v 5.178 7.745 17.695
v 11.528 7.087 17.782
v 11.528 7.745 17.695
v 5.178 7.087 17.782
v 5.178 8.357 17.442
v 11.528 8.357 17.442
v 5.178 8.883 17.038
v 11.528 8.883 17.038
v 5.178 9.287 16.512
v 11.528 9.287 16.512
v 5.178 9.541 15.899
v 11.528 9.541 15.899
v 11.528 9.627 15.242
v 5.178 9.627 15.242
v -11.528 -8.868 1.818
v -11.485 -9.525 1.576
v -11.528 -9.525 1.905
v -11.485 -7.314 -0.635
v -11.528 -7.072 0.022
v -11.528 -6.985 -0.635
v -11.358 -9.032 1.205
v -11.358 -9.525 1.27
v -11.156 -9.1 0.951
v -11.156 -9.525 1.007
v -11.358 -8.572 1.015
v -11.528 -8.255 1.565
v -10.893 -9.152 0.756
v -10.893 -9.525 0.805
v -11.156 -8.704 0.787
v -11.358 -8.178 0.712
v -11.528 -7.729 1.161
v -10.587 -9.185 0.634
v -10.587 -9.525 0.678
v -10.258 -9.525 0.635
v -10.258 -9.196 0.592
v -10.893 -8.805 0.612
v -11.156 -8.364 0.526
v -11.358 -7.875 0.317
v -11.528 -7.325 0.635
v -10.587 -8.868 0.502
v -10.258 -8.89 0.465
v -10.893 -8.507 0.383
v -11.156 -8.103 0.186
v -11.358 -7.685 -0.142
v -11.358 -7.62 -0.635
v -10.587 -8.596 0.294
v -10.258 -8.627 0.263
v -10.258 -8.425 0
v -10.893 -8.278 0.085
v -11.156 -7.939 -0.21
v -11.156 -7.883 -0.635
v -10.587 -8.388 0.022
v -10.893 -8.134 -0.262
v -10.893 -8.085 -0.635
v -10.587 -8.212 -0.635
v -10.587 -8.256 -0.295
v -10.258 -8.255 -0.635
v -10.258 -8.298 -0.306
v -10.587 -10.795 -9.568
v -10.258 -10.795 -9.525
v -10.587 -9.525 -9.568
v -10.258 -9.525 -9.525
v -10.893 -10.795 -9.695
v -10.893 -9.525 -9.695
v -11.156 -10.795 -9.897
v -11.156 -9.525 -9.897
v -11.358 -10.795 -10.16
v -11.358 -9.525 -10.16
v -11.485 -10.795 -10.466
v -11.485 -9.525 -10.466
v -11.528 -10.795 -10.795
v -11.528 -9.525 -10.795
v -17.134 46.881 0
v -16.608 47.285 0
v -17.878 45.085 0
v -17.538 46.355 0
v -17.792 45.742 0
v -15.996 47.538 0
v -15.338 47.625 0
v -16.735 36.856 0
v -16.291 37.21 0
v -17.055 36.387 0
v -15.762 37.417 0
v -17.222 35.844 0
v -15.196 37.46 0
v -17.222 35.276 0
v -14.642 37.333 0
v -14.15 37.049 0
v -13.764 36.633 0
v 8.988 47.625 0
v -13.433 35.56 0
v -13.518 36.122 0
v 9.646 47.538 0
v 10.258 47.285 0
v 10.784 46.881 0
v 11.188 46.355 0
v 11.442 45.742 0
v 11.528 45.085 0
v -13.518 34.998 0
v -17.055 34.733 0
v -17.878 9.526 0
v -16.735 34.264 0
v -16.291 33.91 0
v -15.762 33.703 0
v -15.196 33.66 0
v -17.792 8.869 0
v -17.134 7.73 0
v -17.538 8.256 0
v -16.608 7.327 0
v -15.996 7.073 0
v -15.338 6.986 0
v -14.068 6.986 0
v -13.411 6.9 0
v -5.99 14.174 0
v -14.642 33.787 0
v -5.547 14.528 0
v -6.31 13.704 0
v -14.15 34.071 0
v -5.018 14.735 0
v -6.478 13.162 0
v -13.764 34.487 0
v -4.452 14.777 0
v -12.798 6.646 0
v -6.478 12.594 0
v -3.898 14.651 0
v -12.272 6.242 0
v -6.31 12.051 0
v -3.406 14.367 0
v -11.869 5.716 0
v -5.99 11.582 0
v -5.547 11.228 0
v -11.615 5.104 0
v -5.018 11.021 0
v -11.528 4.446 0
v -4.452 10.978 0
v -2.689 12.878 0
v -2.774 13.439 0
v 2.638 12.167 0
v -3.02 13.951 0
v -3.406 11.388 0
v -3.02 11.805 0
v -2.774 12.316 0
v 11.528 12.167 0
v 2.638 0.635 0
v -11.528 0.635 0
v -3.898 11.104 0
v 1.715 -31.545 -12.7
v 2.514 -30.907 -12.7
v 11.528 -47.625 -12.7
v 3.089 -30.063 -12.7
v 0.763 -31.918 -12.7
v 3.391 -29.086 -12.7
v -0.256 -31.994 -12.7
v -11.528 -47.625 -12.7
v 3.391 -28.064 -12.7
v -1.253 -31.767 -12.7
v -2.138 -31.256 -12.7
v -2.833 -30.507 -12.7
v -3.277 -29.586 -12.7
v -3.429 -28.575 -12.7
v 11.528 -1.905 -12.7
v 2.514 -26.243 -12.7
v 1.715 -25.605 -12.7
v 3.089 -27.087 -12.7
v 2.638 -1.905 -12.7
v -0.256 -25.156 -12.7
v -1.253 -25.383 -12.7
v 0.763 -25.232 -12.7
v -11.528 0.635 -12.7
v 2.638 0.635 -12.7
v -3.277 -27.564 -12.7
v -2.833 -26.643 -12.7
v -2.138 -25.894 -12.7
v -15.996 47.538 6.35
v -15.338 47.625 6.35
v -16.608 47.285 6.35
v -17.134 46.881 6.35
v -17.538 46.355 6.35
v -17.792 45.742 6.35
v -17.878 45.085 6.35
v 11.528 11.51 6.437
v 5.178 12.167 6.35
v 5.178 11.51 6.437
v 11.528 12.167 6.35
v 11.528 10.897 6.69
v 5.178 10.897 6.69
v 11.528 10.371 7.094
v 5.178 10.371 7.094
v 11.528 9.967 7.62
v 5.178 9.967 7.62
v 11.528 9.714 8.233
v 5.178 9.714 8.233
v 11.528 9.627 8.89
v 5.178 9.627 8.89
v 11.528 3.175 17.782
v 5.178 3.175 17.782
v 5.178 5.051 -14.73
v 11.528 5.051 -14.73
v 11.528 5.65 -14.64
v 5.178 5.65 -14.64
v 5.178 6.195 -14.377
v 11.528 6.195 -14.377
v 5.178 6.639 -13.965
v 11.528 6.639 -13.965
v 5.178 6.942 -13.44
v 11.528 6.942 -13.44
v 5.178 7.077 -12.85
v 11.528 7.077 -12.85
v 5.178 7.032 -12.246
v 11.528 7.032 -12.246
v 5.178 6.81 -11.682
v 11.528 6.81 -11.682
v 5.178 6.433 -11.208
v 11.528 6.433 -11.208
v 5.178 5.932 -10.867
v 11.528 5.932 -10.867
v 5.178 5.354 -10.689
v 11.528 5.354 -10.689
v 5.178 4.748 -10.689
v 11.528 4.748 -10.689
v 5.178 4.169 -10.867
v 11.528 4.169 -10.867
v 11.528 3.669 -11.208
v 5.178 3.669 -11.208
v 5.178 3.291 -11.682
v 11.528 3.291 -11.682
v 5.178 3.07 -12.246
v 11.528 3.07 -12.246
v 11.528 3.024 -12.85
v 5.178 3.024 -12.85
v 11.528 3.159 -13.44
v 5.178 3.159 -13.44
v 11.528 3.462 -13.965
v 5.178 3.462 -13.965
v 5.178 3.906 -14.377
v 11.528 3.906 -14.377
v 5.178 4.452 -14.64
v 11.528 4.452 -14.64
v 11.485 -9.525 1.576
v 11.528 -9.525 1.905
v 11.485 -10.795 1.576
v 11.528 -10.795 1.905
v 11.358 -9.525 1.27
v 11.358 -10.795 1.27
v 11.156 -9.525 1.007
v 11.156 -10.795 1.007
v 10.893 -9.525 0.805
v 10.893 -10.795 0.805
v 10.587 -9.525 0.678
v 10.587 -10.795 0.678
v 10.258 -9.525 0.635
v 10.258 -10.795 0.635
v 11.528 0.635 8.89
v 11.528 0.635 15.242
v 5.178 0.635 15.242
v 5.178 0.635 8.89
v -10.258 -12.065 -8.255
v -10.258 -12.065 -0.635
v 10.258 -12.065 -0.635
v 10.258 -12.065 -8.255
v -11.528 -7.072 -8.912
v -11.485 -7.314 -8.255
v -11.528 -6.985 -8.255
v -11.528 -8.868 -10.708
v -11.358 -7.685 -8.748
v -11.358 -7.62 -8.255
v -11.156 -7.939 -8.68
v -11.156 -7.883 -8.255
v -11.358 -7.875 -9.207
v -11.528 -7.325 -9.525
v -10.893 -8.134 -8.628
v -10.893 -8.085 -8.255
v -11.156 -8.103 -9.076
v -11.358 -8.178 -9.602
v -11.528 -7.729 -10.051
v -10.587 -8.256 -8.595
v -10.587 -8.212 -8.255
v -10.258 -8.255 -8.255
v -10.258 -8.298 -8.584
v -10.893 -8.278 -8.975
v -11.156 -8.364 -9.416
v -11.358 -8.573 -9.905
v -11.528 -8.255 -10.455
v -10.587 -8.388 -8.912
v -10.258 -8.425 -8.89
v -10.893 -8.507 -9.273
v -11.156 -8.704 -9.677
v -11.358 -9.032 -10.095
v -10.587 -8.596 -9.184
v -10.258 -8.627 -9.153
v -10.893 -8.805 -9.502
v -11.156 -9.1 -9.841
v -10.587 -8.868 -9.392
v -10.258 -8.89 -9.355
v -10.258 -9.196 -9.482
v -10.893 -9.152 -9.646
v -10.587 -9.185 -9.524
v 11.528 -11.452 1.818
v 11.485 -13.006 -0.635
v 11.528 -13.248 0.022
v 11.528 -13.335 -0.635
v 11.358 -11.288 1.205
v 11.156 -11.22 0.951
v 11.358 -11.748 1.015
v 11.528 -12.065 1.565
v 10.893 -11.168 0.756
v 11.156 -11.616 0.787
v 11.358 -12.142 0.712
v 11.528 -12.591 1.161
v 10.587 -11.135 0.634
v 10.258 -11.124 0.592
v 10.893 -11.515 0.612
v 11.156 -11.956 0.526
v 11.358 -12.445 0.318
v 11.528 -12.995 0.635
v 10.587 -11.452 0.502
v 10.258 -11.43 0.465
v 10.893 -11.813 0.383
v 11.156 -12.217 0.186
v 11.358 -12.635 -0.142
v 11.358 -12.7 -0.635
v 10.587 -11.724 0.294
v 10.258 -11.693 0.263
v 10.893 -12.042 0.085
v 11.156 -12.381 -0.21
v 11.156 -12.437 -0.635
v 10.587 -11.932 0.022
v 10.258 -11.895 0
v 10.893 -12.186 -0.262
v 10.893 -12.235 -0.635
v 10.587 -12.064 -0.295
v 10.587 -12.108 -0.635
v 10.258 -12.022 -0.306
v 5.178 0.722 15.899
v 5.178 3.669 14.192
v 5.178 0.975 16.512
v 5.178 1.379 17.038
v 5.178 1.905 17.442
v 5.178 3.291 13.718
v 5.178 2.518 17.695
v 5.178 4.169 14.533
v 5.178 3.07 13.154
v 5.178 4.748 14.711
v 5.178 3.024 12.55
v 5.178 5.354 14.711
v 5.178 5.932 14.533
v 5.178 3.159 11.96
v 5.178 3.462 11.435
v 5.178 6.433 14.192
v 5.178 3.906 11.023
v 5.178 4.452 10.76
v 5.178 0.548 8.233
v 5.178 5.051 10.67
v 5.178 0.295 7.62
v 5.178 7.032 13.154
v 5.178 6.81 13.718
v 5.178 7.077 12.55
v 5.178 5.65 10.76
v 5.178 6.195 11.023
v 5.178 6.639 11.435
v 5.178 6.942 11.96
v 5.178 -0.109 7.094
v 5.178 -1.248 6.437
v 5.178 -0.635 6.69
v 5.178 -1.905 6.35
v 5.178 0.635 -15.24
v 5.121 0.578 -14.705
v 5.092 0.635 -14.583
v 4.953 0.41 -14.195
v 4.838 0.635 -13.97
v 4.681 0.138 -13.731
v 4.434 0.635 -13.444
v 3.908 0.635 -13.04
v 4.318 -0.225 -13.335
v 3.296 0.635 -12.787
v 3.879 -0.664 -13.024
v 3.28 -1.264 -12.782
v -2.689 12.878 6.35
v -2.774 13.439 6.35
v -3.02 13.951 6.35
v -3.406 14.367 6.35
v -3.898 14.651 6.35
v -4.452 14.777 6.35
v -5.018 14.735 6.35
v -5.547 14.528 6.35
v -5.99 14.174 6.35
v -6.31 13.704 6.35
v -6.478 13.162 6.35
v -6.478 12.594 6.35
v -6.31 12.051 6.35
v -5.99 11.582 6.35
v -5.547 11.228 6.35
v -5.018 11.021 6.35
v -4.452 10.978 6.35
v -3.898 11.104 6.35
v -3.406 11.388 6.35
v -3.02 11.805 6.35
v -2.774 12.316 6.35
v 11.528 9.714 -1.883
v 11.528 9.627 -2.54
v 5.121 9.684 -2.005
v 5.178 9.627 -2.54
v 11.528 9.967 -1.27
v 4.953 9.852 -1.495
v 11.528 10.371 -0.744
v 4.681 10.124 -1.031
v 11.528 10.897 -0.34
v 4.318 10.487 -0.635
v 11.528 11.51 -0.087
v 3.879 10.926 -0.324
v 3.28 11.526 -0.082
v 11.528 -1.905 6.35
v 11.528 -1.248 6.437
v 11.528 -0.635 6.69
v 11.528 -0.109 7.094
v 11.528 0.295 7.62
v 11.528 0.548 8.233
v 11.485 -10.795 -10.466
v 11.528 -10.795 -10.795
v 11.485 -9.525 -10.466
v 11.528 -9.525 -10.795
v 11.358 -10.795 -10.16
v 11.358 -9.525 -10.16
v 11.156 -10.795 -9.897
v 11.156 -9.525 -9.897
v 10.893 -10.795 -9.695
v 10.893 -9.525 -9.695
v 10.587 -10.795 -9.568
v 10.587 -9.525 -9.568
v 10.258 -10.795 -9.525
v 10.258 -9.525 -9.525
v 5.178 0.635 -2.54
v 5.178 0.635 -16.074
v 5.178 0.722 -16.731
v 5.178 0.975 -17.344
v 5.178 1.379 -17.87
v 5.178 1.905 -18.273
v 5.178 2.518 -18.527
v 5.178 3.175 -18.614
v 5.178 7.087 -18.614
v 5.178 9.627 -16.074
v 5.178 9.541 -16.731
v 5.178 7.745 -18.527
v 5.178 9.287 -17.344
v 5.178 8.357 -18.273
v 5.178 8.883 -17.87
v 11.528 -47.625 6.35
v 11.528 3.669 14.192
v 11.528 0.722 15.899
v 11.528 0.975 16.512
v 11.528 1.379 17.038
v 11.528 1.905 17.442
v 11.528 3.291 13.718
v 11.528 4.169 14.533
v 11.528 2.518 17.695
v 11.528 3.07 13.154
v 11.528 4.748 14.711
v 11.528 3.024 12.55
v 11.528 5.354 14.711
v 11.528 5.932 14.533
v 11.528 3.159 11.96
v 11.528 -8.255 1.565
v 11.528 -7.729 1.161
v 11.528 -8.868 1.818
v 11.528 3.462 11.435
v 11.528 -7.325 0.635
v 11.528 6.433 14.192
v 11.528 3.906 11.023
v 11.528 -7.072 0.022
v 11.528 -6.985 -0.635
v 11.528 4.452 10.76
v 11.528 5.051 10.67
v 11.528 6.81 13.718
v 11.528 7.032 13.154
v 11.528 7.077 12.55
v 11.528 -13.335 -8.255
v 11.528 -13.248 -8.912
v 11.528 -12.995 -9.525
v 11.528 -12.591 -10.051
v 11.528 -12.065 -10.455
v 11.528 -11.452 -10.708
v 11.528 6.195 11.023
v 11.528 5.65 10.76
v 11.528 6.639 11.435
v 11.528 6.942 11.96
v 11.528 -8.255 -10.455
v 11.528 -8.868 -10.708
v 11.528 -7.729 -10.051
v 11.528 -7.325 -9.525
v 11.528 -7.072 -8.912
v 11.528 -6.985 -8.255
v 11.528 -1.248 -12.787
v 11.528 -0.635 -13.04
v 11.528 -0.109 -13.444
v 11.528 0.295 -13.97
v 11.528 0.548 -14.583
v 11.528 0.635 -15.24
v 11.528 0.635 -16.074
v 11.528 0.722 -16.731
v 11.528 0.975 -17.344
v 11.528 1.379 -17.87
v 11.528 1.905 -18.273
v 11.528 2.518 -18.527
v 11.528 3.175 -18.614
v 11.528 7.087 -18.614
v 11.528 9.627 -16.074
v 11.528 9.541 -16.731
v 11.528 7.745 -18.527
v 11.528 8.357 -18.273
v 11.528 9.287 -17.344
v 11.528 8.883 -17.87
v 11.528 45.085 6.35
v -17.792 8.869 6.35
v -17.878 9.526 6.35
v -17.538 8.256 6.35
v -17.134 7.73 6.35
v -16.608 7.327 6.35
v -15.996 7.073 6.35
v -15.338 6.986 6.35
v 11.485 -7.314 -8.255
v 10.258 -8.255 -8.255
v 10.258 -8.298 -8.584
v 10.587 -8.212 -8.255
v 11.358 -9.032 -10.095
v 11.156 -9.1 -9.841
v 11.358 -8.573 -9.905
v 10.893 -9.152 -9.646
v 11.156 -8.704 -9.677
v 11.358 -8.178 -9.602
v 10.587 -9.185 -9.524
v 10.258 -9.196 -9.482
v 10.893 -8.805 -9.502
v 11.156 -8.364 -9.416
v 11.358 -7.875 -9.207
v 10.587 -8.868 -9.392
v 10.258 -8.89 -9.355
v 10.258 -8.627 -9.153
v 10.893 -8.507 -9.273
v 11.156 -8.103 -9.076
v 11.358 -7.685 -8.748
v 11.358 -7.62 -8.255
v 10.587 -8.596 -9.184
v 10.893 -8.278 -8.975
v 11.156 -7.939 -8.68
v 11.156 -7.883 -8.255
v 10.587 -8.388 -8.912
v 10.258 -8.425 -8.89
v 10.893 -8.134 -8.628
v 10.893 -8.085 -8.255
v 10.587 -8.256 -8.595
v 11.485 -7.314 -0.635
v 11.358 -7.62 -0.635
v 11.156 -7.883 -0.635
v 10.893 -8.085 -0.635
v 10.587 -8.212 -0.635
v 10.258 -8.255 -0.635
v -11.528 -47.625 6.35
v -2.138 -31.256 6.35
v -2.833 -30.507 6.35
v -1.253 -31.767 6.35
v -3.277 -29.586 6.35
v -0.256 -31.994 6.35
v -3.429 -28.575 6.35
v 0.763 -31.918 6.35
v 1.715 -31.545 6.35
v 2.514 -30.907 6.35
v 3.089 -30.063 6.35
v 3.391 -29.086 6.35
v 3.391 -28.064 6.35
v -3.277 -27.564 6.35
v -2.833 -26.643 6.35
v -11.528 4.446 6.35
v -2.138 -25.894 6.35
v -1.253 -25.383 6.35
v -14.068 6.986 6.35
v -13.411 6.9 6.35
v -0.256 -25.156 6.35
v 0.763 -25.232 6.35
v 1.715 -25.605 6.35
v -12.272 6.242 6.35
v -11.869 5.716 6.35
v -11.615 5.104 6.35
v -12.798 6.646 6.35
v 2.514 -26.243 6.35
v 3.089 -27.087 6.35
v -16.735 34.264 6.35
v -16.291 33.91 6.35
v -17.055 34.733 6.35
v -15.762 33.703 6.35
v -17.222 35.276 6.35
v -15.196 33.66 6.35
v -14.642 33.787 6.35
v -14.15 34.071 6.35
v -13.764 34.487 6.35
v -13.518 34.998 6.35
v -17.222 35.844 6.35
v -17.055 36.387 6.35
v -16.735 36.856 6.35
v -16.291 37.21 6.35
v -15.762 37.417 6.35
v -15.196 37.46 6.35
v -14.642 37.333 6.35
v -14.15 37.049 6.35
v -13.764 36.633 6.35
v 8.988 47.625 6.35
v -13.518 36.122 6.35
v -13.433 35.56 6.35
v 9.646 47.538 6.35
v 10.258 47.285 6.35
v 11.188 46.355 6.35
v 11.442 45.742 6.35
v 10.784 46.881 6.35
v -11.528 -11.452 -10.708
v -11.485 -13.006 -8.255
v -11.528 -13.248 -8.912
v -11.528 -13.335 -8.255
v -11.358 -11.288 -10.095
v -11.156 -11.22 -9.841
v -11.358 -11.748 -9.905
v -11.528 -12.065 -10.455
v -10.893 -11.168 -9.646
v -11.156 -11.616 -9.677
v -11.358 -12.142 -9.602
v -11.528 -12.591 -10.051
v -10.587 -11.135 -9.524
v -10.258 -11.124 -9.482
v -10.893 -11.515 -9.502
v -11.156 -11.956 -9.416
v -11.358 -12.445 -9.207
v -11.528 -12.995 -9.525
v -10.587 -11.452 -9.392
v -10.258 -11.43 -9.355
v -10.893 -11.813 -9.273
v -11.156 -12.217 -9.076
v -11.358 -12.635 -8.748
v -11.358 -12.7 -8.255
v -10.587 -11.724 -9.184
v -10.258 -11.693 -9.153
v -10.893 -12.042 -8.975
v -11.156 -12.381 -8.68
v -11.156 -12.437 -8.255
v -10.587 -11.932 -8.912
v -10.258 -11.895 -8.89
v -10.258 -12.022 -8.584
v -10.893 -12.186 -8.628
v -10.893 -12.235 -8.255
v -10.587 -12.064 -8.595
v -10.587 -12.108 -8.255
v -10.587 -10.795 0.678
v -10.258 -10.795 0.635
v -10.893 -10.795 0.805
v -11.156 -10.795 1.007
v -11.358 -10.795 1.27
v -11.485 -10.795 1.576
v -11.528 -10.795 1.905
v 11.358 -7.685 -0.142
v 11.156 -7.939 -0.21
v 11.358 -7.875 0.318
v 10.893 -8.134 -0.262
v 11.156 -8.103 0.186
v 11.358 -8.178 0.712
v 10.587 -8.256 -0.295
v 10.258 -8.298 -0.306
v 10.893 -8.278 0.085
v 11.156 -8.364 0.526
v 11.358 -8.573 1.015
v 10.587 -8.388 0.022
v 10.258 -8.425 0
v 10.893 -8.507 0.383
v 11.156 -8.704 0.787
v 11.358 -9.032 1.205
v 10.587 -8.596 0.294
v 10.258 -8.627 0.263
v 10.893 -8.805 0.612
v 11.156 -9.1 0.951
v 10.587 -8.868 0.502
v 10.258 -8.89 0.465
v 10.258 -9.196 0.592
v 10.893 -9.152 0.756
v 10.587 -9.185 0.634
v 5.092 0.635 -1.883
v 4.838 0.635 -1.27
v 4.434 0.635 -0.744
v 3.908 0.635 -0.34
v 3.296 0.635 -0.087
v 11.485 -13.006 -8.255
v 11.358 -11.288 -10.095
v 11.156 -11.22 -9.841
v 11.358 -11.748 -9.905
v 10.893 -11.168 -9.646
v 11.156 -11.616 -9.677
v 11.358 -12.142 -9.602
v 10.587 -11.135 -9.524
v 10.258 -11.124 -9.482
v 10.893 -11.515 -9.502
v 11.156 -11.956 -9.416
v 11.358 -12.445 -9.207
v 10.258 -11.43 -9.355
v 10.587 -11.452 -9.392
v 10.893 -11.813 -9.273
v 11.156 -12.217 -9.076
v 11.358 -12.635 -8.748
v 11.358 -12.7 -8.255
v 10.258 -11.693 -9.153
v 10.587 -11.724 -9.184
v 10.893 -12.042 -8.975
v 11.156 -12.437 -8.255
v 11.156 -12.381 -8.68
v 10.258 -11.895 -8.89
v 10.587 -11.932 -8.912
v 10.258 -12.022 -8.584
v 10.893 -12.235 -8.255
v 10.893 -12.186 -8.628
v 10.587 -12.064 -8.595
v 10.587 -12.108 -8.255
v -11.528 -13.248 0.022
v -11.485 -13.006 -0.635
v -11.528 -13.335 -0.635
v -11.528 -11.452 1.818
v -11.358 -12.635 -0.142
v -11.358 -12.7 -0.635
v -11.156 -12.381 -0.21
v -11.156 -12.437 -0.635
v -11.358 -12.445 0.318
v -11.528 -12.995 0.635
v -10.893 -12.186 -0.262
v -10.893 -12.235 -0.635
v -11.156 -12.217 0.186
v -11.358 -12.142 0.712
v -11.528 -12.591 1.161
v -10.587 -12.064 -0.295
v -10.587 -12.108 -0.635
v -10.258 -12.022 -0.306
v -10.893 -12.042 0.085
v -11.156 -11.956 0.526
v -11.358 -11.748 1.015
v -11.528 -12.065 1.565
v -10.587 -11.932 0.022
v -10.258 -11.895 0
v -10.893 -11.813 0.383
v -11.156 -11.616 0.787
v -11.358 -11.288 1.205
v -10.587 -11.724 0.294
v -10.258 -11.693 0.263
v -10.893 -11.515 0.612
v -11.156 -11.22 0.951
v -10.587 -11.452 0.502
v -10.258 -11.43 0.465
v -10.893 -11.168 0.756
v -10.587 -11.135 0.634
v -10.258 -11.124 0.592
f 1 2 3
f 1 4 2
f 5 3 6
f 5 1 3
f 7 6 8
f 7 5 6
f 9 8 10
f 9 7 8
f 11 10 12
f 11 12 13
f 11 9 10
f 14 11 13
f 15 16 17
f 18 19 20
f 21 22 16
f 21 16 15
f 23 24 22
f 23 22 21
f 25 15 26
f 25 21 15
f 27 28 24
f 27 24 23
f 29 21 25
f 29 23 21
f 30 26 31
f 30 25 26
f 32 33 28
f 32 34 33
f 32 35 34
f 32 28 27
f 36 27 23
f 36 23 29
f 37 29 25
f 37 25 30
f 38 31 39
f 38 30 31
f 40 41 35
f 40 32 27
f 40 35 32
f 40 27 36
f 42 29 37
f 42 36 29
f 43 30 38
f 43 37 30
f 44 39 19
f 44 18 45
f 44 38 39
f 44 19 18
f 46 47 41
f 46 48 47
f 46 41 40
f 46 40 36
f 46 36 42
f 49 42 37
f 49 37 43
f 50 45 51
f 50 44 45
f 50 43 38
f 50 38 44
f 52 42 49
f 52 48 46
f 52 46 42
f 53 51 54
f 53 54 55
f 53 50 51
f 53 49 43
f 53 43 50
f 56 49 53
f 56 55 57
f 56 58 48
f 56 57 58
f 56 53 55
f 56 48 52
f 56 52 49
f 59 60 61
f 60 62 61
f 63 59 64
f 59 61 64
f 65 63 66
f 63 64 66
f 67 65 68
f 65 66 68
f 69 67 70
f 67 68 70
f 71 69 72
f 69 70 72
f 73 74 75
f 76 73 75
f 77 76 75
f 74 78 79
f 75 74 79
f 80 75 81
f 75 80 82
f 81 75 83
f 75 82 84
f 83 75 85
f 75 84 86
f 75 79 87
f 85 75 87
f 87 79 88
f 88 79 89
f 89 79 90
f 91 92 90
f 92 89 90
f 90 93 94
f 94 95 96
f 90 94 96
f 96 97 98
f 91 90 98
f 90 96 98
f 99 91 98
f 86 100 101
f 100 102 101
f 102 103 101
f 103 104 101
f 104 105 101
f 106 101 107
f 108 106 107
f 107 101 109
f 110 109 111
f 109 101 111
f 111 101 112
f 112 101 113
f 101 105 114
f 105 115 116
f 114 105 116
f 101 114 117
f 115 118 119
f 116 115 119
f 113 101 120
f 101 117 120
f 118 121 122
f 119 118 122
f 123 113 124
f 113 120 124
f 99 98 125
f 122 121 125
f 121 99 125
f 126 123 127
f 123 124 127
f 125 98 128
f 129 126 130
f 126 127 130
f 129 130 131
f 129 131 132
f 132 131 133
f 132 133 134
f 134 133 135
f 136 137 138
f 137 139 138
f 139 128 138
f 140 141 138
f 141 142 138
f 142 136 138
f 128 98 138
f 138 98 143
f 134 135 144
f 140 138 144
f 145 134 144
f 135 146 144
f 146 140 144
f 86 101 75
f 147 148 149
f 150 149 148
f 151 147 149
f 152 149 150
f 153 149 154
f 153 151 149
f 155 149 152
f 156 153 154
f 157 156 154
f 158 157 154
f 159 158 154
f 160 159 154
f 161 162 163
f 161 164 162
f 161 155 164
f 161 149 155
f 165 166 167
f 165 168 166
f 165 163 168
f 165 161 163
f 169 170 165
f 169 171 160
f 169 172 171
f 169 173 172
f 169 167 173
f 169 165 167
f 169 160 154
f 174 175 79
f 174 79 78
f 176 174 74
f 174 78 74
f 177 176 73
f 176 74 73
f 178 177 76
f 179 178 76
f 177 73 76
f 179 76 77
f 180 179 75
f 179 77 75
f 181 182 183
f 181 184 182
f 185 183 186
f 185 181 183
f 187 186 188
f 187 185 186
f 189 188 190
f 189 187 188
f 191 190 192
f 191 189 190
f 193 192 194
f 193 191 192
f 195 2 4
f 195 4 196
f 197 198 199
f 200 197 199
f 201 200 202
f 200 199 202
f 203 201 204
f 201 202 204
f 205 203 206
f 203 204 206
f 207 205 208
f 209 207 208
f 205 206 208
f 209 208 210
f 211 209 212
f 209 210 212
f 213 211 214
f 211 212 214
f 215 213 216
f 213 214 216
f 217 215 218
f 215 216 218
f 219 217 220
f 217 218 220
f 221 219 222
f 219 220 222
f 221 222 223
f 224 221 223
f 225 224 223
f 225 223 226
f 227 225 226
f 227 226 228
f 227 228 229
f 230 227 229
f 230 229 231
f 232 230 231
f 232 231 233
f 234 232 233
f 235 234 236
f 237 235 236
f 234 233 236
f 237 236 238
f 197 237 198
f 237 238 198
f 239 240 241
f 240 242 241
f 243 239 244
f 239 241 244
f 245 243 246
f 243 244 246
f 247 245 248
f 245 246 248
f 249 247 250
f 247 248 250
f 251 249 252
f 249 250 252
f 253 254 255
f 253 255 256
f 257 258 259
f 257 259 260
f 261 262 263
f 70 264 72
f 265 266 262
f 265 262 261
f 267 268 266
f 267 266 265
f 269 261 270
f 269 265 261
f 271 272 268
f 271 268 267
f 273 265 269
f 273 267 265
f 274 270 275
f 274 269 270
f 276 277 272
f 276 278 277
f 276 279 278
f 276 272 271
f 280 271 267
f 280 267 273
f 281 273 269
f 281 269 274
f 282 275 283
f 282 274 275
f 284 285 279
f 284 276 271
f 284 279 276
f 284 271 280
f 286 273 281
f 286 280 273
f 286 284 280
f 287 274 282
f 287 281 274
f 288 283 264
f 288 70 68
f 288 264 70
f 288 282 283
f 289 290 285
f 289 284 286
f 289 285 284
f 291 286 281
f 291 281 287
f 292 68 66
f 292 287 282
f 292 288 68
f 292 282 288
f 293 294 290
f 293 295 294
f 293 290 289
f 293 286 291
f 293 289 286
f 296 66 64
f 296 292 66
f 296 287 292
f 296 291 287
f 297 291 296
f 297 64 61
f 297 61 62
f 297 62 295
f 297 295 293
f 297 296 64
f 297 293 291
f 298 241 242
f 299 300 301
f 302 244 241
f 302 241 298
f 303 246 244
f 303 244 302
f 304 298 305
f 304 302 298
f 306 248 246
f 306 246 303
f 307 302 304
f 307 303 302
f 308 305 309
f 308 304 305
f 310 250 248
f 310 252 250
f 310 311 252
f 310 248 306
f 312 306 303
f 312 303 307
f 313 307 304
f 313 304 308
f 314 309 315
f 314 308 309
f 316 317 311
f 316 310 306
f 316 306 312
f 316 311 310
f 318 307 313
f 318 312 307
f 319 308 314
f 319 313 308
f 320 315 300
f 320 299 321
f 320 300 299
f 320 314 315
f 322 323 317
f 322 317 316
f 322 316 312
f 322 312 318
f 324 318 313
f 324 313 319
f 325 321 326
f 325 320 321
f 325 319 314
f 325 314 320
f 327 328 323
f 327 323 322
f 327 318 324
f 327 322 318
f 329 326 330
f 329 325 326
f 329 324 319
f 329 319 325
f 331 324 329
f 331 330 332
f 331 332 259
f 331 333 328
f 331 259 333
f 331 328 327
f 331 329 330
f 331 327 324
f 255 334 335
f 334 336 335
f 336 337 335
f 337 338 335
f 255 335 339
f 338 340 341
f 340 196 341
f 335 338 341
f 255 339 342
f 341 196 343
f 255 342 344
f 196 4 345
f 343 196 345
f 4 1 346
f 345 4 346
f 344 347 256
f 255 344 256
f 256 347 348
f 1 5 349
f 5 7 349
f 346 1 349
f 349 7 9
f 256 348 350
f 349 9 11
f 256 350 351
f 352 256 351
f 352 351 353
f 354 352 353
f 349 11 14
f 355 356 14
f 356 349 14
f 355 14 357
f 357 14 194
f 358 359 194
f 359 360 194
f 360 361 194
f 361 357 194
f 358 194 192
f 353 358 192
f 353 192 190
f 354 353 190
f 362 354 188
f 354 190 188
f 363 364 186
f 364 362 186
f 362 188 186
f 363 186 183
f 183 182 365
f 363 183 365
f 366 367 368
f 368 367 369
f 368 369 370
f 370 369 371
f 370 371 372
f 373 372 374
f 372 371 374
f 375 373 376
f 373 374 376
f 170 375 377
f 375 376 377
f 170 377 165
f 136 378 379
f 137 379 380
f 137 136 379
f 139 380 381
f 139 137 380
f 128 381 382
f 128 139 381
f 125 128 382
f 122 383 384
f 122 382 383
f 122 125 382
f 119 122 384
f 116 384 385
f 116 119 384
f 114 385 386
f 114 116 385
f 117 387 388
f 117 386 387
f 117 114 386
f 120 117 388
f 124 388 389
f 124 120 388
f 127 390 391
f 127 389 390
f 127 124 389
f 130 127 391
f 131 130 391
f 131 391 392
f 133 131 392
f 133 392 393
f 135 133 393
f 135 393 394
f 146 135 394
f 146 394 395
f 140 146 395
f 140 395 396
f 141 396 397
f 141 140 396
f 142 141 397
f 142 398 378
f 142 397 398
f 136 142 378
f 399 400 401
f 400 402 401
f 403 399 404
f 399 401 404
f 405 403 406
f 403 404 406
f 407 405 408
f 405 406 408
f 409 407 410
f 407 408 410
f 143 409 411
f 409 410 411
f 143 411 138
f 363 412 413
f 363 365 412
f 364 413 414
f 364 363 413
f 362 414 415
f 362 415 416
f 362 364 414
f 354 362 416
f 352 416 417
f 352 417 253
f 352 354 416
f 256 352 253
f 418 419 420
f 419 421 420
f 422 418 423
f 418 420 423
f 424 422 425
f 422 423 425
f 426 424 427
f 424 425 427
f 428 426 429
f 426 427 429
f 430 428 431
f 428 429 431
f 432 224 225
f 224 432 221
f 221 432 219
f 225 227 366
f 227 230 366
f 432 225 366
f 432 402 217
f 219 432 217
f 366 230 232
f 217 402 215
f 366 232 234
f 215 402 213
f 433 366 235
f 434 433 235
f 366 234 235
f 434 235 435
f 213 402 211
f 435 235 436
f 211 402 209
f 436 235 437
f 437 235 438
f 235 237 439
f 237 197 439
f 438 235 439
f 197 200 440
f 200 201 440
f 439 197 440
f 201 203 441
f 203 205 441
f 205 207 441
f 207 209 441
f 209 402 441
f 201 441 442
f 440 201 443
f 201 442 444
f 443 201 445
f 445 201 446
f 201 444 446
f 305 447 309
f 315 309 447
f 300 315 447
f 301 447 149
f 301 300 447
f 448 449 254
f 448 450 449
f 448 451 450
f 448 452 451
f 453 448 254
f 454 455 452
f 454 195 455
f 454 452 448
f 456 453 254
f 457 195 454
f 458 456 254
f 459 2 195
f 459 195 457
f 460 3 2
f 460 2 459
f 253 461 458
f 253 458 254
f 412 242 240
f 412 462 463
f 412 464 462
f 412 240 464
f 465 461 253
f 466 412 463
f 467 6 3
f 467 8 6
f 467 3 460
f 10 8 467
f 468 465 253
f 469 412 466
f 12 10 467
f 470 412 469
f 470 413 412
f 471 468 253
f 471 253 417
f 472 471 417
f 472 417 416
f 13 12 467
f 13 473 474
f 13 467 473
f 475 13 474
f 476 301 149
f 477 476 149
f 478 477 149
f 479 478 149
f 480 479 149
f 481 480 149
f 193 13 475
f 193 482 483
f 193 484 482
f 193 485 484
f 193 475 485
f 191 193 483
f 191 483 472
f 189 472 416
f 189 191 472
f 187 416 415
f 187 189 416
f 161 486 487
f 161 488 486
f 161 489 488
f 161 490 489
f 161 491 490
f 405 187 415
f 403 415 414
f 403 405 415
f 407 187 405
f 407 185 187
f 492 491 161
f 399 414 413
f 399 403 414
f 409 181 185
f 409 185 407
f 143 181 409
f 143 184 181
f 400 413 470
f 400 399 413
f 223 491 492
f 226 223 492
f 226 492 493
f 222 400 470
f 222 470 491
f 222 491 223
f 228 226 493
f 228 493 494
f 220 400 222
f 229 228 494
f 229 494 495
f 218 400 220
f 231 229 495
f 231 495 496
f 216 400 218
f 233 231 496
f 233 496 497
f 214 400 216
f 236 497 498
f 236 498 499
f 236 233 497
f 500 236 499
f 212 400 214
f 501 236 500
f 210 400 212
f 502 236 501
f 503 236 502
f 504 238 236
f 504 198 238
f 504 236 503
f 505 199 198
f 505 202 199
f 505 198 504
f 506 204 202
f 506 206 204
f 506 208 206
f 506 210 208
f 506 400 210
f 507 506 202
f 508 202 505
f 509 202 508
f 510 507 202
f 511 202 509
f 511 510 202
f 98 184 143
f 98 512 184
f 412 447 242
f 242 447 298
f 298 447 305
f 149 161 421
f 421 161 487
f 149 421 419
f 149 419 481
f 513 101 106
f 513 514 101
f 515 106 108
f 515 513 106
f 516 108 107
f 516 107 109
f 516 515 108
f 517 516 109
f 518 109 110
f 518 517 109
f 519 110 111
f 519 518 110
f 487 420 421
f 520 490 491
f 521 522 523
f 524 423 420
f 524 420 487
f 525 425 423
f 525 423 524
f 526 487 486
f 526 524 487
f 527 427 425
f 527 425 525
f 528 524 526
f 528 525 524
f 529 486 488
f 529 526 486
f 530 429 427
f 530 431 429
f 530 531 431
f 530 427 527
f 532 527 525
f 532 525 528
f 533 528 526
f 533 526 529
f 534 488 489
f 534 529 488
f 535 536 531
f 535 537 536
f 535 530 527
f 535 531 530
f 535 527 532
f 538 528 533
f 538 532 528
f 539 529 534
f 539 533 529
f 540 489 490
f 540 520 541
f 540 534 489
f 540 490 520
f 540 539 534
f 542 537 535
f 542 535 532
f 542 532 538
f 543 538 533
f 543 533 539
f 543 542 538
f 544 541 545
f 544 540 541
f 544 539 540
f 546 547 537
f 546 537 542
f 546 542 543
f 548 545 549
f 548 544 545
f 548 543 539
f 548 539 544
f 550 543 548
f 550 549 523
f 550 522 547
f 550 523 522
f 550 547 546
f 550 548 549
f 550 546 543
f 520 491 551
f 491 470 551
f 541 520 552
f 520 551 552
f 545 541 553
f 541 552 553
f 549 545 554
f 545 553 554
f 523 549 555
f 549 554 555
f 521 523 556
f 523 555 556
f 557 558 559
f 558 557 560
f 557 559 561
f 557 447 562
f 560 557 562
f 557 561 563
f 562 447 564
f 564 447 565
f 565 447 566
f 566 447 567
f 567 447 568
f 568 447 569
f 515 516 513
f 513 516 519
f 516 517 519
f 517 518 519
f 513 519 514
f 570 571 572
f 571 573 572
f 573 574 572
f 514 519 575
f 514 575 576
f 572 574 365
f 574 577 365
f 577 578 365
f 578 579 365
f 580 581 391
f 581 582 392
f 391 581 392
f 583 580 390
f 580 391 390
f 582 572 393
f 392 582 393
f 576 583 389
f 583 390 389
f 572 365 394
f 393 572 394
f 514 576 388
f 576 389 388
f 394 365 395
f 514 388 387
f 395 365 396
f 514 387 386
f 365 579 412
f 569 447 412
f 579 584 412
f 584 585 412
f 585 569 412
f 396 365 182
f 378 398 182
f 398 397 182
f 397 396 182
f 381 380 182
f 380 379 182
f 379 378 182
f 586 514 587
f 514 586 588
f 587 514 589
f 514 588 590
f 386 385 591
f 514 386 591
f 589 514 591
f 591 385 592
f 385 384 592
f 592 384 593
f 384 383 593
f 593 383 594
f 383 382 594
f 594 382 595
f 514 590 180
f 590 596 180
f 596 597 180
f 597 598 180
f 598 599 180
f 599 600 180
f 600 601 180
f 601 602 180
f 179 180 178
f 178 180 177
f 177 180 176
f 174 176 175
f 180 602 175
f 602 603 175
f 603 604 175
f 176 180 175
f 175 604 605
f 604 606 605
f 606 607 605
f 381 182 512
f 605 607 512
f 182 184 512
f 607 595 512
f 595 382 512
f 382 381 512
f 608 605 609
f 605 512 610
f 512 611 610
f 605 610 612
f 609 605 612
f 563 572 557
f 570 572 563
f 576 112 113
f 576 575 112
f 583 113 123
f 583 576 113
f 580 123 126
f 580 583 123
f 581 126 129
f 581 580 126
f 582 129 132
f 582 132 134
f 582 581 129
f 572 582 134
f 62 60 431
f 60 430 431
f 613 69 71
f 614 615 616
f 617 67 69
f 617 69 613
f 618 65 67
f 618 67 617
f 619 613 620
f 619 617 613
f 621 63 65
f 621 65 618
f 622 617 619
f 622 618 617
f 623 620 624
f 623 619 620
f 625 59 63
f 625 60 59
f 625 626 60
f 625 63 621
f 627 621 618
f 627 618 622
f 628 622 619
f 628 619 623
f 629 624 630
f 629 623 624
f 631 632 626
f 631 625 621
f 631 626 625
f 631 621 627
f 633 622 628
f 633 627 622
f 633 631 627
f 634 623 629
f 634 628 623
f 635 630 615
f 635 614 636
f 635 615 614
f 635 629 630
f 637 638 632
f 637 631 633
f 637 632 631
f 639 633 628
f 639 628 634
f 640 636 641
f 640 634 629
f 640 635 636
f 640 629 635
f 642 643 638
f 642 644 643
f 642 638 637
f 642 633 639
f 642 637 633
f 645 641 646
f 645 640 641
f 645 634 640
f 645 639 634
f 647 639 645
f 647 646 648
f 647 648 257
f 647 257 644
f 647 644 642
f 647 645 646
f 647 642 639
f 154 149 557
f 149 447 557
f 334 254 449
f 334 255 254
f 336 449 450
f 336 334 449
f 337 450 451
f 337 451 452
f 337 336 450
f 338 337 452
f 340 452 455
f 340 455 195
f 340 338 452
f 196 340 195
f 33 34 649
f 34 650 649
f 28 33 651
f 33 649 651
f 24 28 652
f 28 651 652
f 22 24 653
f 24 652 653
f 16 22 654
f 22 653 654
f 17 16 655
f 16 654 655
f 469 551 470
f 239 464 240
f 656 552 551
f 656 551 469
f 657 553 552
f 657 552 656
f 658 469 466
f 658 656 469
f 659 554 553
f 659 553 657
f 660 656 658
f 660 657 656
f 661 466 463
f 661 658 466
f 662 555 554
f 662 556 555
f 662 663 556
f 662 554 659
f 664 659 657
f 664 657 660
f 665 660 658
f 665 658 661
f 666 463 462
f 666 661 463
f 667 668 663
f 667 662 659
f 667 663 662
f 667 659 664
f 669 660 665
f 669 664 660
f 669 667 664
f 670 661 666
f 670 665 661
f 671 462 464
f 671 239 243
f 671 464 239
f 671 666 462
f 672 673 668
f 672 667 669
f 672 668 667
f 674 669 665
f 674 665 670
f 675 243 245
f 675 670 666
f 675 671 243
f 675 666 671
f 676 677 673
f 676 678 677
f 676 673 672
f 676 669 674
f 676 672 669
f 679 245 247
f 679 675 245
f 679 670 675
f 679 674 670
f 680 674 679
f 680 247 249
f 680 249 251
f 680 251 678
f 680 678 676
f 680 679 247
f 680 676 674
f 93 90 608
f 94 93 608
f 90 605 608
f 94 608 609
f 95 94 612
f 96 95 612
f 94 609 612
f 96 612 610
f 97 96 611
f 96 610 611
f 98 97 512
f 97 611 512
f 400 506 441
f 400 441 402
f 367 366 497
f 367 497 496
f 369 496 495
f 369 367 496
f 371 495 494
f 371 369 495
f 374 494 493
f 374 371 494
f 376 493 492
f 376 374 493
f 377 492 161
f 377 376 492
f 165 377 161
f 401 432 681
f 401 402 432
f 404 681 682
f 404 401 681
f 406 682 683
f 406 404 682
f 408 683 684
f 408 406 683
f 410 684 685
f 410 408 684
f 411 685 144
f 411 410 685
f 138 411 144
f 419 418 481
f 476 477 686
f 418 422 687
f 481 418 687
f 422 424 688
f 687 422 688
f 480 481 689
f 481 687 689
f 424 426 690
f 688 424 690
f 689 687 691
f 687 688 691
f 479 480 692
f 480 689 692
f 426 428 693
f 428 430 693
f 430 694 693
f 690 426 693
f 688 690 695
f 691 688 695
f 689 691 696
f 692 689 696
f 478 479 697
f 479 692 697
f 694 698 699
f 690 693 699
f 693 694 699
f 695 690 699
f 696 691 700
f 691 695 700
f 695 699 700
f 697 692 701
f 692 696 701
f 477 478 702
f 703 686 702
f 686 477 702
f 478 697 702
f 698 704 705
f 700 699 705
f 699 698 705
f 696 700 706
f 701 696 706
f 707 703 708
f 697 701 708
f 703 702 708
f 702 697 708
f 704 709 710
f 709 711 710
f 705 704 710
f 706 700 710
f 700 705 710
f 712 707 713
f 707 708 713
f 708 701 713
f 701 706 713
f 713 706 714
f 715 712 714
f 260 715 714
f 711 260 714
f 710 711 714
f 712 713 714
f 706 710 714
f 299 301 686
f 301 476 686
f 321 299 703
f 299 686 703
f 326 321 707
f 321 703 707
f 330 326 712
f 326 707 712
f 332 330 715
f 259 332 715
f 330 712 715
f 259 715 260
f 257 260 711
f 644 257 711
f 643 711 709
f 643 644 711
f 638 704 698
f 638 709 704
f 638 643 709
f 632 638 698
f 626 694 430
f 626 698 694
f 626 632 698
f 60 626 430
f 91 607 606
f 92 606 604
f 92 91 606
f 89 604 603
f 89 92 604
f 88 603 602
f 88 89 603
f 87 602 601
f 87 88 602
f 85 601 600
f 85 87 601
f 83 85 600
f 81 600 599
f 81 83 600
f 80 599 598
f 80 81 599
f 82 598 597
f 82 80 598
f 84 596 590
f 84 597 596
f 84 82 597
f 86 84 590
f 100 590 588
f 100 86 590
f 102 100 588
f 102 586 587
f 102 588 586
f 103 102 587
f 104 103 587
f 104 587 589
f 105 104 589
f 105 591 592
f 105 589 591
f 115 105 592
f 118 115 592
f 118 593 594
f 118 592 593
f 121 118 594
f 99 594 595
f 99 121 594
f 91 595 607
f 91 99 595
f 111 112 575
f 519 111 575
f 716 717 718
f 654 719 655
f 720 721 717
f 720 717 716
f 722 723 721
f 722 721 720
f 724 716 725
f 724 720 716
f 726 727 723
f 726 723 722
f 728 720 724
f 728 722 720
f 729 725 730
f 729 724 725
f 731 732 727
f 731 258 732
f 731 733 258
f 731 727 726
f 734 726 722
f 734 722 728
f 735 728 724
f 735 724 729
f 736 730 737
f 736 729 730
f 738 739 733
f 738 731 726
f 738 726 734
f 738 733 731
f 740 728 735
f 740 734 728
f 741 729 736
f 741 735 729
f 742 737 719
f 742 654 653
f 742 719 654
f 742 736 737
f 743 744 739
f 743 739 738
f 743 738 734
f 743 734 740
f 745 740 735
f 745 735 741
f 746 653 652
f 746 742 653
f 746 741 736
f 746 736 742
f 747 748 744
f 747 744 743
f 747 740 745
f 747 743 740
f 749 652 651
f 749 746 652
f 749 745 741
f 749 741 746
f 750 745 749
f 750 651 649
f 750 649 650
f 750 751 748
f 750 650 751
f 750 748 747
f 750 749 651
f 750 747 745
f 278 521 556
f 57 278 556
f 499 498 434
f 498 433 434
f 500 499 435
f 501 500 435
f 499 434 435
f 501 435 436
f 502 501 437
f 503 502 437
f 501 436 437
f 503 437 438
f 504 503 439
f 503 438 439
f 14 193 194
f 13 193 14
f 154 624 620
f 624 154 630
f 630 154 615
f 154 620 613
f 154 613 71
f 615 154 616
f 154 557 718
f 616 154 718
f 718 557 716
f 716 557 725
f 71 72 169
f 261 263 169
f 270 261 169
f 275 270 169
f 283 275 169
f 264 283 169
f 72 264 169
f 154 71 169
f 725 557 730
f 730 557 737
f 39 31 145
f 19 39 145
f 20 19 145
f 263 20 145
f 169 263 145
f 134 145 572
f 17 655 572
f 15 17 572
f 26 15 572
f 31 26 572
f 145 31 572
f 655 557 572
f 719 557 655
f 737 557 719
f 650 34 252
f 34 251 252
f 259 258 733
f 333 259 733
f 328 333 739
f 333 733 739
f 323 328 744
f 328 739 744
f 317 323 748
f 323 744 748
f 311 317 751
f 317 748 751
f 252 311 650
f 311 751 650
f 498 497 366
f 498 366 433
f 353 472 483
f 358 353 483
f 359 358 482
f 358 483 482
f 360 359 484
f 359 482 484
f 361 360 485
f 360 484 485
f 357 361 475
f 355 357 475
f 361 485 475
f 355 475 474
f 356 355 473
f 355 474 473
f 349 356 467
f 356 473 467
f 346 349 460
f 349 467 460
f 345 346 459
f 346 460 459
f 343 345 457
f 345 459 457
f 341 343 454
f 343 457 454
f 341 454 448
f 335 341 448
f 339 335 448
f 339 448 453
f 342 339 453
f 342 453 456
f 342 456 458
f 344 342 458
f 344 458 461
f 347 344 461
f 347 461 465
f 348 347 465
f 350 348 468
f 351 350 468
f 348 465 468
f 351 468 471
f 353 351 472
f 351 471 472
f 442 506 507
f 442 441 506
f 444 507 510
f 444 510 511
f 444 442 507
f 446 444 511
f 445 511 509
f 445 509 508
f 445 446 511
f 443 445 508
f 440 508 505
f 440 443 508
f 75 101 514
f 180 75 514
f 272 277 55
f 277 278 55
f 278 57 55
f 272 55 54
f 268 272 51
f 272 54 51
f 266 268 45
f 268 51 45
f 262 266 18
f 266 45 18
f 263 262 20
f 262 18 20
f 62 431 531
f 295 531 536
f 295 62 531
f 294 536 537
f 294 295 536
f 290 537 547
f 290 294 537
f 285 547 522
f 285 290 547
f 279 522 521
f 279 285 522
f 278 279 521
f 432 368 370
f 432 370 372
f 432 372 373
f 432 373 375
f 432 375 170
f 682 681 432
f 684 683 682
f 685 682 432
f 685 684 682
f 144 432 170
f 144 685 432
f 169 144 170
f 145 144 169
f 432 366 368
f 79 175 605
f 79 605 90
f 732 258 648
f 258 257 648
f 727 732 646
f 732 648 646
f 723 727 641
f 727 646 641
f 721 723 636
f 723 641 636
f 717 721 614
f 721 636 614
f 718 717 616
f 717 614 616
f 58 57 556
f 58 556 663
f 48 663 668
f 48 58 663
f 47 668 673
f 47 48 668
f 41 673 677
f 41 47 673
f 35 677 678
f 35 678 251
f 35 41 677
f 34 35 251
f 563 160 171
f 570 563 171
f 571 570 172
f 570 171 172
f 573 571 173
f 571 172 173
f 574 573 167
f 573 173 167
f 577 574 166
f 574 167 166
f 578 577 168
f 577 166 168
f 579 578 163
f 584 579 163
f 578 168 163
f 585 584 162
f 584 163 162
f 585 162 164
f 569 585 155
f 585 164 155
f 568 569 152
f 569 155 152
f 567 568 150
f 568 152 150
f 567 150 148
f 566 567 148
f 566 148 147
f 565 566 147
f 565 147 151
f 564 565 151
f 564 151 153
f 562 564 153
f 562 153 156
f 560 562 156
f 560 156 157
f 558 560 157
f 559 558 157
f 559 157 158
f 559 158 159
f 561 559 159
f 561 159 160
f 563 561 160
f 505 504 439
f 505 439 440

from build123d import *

# Parameters (mm, degrees)
SKETCH1_W           = 23.056445047489827
SKETCH1_H           = 95.25
SKETCH1_R           = 1.2700000000000005
SKETCH1_R_2         = 1.269999999999998
BOSS_EXTRUDE1_DEPTH = 6.35
SKETCH2_W           = 23.056445047489827
SKETCH2_H           = 48.26
BOSS_EXTRUDE2_DEPTH = 12.7
CUT_EXTRUDE2_DEPTH  = 55.41534970233967
SKETCH6_R           = 3.4289999999999994
CUT_EXTRUDE3_DEPTH  = 53.57321599024526
FILLET2_R           = 1.27
BOSS_EXTRUDE3_DEPTH = 6.35
SKETCH9_R           = 1.9049999999999996
SKETCH9_R_2         = 1.905
CUT_EXTRUDE4_DEPTH  = 53.43149307056342
FILLET4_R           = 2.54
BOSS_EXTRUDE7_DEPTH = 6.35
FILLET5_R           = 2.54
FILLET6_R           = 2.54
SKETCH13_R          = 2.0319999999999987
SKETCH13_R_2        = 2.032000000000001
CUT_EXTRUDE5_DEPTH  = 6.35
FILLET7_R           = 2.54


with BuildPart() as part:
    # Sketch1 → Boss-Extrude1 (new body)
    # profile 1 of 4: a face of its own
    with BuildSketch(Plane.XY):
        Rectangle(SKETCH1_W, SKETCH1_H)
        Polygon((7.9121000000000015, 16.687800000000006), (7.9121000000000015, 44.449999999999996), (-7.912099999999998, 44.45), (-7.912099999999998, 16.687800000000006), align=None, mode=Mode.SUBTRACT)
    # profile 2 of 4: a face of its own
    with BuildSketch(Plane.XY):
        Polygon((-7.912099999999998, 16.687800000000006), (7.9121000000000015, 16.687800000000006), (7.9121000000000015, 44.449999999999996), (-7.912099999999998, 44.45), align=None)
        with Locations((5.372100000000001, 19.227800000000006)):
            Circle(SKETCH1_R, mode=Mode.SUBTRACT)
        with Locations((-5.372099999999998, 41.910000000000004)):
            Circle(SKETCH1_R_2, mode=Mode.SUBTRACT)
    # profile 3 of 4: a face of its own
    with BuildSketch(Plane.XY):
        with Locations((-5.372099999999998, 41.910000000000004)):
            Circle(SKETCH1_R_2)
    # profile 4 of 4: a face of its own
    with BuildSketch(Plane.XY):
        with Locations((5.372100000000001, 19.227800000000006)):
            Circle(SKETCH1_R)
    extrude(amount=BOSS_EXTRUDE1_DEPTH)

    # Sketch2 → Boss-Extrude2 (add)
    with BuildSketch(Plane(origin=(0, 0, 0), x_dir=(-1, 0, 0), z_dir=(0, 0, -1))):
        with Locations((0, -23.495)):
            Rectangle(SKETCH2_W, SKETCH2_H)
    extrude(amount=BOSS_EXTRUDE2_DEPTH)

    # Sketch5 → Cut-Extrude2 (cut, through all)
    with BuildSketch(Plane(origin=(11.528222523744914, 0, 0), x_dir=(0, 0, -1), z_dir=(1, 0, 0))):
        Polygon((-0.6350000000000019, -12.065000000000001), (9.524999999999997, -12.065000000000001), (9.524999999999999, -8.255000000000003), (-0.6350000000000019, -8.255000000000003), align=None)
    extrude(amount=-CUT_EXTRUDE2_DEPTH, mode=Mode.SUBTRACT)

    # Sketch6 → Cut-Extrude3 (cut, through all)
    with BuildSketch(Plane(origin=(0, 0, -12.7), x_dir=(-1, 0, 0), z_dir=(0, 0, -1))):
        with Locations((0, -28.575)):
            Circle(SKETCH6_R)
    extrude(amount=-CUT_EXTRUDE3_DEPTH, mode=Mode.SUBTRACT)

    # Fillet2
    fillet2_edges = [part.edges().sort_by_distance(p)[0] for p in [
        (-11.528222523744914, -10.160000000000004, -9.524999999999999),
        (0, -8.255000000000003, -9.524999999999999),
        (-11.528222523744914, -12.065, -4.444999999999998),
        (0, -12.065000000000001, -9.524999999999997),
        (-11.528222523744914, -10.16, 0.6350000000000019),
        (0, -12.065000000000001, 0.6350000000000019),
        (-11.528222523744914, -8.255000000000003, -4.4449999999999985),
        (0, -8.255000000000003, 0.6350000000000019),
        (11.528222523744914, -10.160000000000002, -9.524999999999999),
        (11.528222523744914, -8.255000000000003, -4.4449999999999985),
        (11.528222523744914, -10.160000000000002, 0.6350000000000019),
        (11.528222523744914, -12.065000000000001, -4.444999999999998),
    ]]
    fillet(fillet2_edges, radius=FILLET2_R)

    # Sketch8 → Boss-Extrude3 (add)
    with BuildSketch(Plane.ZY.offset(11.528222523744914)):
        Polygon((6.35, 47.625), (-1.21e-15, 47.625), (0, 6.98625472546675), (6.350000000000005, 6.986254725466751), align=None)
    extrude(amount=BOSS_EXTRUDE3_DEPTH)

    # Sketch9 → Cut-Extrude4 (cut, through all)
    with BuildSketch(Plane.XY):
        with Locations((-4.594022523744915, 12.877800000000006)):
            Circle(SKETCH9_R)
        with Locations((-15.338222523744914, 35.56)):
            Circle(SKETCH9_R_2)
    extrude(amount=CUT_EXTRUDE4_DEPTH, mode=Mode.SUBTRACT)

    # Fillet4
    fillet4_edges = [part.edges().sort_by_distance(p)[0] for p in [
        (11.528222523744914, 47.625, 3.175),
        (-11.528222523744914, 6.98625472546675, 3.1750000000000025),
        (-17.878222523744913, 47.625, 3.1749999999999994),
        (-17.878222523744913, 6.98625472546675, 3.1750000000000025),
    ]]
    fillet(fillet4_edges, radius=FILLET4_R)

    # Sketch12 → Boss-Extrude7 (add)
    with BuildSketch(Plane(origin=(11.528222523744914, 0, 0), x_dir=(0, 0, -1), z_dir=(1, 0, 0))):
        Polygon((-6.35, 0.6349999999999898), (18.613653389650153, 0.6349999999999898), (18.613653389650153, 9.627193152709879), (-17.78195834691587, 9.627193152709879), (-17.78195834691587, 0.6349999999999898), align=None)
    extrude(amount=-BOSS_EXTRUDE7_DEPTH)

    # Fillet5
    fillet5_edges = [part.edges().sort_by_distance(p)[0] for p in [
        (8.353222523744913, 0.6349999999999967, -12.7),
        (8.353222523744915, 9.627193152709879, 6.3500000000000005),
        (8.353222523744915, 9.627193152709879, 0),
        (5.178222523744914, 5.131096576354938, 0),
        (8.353222523744915, 0.6349999999999898, 6.35),
    ]]
    fillet(fillet5_edges, radius=FILLET5_R)

    # Fillet6
    fillet6_edges = [part.edges().sort_by_distance(p)[0] for p in [
        (5.178222523744914, -0.6350000000000069, -12.7),
    ]]
    fillet(fillet6_edges, radius=FILLET6_R)

    # Sketch13 → Cut-Extrude5 (cut)
    with BuildSketch(Plane(origin=(11.528222523744914, 0, 0), x_dir=(0, 0, -1), z_dir=(1, 0, 0))):
        with Locations((-12.70195834691587, 5.050717249087455)):
            Circle(SKETCH13_R)
        with Locations((12.698041653084129, 5.050717249087455)):
            Circle(SKETCH13_R_2)
    extrude(amount=-CUT_EXTRUDE5_DEPTH, mode=Mode.SUBTRACT)

    # Fillet7
    fillet7_edges = [part.edges().sort_by_distance(p)[0] for p in [
        (8.353222523744915, 0.6349999999999898, -18.613653389650153),
        (8.353222523744915, 0.6349999999999898, 17.78195834691587),
        (8.353222523744915, 9.627193152709879, 17.78195834691587),
        (8.353222523744915, 9.627193152709879, -18.613653389650153),
    ]]
    fillet(fillet7_edges, radius=FILLET7_R)


solid = part.part
